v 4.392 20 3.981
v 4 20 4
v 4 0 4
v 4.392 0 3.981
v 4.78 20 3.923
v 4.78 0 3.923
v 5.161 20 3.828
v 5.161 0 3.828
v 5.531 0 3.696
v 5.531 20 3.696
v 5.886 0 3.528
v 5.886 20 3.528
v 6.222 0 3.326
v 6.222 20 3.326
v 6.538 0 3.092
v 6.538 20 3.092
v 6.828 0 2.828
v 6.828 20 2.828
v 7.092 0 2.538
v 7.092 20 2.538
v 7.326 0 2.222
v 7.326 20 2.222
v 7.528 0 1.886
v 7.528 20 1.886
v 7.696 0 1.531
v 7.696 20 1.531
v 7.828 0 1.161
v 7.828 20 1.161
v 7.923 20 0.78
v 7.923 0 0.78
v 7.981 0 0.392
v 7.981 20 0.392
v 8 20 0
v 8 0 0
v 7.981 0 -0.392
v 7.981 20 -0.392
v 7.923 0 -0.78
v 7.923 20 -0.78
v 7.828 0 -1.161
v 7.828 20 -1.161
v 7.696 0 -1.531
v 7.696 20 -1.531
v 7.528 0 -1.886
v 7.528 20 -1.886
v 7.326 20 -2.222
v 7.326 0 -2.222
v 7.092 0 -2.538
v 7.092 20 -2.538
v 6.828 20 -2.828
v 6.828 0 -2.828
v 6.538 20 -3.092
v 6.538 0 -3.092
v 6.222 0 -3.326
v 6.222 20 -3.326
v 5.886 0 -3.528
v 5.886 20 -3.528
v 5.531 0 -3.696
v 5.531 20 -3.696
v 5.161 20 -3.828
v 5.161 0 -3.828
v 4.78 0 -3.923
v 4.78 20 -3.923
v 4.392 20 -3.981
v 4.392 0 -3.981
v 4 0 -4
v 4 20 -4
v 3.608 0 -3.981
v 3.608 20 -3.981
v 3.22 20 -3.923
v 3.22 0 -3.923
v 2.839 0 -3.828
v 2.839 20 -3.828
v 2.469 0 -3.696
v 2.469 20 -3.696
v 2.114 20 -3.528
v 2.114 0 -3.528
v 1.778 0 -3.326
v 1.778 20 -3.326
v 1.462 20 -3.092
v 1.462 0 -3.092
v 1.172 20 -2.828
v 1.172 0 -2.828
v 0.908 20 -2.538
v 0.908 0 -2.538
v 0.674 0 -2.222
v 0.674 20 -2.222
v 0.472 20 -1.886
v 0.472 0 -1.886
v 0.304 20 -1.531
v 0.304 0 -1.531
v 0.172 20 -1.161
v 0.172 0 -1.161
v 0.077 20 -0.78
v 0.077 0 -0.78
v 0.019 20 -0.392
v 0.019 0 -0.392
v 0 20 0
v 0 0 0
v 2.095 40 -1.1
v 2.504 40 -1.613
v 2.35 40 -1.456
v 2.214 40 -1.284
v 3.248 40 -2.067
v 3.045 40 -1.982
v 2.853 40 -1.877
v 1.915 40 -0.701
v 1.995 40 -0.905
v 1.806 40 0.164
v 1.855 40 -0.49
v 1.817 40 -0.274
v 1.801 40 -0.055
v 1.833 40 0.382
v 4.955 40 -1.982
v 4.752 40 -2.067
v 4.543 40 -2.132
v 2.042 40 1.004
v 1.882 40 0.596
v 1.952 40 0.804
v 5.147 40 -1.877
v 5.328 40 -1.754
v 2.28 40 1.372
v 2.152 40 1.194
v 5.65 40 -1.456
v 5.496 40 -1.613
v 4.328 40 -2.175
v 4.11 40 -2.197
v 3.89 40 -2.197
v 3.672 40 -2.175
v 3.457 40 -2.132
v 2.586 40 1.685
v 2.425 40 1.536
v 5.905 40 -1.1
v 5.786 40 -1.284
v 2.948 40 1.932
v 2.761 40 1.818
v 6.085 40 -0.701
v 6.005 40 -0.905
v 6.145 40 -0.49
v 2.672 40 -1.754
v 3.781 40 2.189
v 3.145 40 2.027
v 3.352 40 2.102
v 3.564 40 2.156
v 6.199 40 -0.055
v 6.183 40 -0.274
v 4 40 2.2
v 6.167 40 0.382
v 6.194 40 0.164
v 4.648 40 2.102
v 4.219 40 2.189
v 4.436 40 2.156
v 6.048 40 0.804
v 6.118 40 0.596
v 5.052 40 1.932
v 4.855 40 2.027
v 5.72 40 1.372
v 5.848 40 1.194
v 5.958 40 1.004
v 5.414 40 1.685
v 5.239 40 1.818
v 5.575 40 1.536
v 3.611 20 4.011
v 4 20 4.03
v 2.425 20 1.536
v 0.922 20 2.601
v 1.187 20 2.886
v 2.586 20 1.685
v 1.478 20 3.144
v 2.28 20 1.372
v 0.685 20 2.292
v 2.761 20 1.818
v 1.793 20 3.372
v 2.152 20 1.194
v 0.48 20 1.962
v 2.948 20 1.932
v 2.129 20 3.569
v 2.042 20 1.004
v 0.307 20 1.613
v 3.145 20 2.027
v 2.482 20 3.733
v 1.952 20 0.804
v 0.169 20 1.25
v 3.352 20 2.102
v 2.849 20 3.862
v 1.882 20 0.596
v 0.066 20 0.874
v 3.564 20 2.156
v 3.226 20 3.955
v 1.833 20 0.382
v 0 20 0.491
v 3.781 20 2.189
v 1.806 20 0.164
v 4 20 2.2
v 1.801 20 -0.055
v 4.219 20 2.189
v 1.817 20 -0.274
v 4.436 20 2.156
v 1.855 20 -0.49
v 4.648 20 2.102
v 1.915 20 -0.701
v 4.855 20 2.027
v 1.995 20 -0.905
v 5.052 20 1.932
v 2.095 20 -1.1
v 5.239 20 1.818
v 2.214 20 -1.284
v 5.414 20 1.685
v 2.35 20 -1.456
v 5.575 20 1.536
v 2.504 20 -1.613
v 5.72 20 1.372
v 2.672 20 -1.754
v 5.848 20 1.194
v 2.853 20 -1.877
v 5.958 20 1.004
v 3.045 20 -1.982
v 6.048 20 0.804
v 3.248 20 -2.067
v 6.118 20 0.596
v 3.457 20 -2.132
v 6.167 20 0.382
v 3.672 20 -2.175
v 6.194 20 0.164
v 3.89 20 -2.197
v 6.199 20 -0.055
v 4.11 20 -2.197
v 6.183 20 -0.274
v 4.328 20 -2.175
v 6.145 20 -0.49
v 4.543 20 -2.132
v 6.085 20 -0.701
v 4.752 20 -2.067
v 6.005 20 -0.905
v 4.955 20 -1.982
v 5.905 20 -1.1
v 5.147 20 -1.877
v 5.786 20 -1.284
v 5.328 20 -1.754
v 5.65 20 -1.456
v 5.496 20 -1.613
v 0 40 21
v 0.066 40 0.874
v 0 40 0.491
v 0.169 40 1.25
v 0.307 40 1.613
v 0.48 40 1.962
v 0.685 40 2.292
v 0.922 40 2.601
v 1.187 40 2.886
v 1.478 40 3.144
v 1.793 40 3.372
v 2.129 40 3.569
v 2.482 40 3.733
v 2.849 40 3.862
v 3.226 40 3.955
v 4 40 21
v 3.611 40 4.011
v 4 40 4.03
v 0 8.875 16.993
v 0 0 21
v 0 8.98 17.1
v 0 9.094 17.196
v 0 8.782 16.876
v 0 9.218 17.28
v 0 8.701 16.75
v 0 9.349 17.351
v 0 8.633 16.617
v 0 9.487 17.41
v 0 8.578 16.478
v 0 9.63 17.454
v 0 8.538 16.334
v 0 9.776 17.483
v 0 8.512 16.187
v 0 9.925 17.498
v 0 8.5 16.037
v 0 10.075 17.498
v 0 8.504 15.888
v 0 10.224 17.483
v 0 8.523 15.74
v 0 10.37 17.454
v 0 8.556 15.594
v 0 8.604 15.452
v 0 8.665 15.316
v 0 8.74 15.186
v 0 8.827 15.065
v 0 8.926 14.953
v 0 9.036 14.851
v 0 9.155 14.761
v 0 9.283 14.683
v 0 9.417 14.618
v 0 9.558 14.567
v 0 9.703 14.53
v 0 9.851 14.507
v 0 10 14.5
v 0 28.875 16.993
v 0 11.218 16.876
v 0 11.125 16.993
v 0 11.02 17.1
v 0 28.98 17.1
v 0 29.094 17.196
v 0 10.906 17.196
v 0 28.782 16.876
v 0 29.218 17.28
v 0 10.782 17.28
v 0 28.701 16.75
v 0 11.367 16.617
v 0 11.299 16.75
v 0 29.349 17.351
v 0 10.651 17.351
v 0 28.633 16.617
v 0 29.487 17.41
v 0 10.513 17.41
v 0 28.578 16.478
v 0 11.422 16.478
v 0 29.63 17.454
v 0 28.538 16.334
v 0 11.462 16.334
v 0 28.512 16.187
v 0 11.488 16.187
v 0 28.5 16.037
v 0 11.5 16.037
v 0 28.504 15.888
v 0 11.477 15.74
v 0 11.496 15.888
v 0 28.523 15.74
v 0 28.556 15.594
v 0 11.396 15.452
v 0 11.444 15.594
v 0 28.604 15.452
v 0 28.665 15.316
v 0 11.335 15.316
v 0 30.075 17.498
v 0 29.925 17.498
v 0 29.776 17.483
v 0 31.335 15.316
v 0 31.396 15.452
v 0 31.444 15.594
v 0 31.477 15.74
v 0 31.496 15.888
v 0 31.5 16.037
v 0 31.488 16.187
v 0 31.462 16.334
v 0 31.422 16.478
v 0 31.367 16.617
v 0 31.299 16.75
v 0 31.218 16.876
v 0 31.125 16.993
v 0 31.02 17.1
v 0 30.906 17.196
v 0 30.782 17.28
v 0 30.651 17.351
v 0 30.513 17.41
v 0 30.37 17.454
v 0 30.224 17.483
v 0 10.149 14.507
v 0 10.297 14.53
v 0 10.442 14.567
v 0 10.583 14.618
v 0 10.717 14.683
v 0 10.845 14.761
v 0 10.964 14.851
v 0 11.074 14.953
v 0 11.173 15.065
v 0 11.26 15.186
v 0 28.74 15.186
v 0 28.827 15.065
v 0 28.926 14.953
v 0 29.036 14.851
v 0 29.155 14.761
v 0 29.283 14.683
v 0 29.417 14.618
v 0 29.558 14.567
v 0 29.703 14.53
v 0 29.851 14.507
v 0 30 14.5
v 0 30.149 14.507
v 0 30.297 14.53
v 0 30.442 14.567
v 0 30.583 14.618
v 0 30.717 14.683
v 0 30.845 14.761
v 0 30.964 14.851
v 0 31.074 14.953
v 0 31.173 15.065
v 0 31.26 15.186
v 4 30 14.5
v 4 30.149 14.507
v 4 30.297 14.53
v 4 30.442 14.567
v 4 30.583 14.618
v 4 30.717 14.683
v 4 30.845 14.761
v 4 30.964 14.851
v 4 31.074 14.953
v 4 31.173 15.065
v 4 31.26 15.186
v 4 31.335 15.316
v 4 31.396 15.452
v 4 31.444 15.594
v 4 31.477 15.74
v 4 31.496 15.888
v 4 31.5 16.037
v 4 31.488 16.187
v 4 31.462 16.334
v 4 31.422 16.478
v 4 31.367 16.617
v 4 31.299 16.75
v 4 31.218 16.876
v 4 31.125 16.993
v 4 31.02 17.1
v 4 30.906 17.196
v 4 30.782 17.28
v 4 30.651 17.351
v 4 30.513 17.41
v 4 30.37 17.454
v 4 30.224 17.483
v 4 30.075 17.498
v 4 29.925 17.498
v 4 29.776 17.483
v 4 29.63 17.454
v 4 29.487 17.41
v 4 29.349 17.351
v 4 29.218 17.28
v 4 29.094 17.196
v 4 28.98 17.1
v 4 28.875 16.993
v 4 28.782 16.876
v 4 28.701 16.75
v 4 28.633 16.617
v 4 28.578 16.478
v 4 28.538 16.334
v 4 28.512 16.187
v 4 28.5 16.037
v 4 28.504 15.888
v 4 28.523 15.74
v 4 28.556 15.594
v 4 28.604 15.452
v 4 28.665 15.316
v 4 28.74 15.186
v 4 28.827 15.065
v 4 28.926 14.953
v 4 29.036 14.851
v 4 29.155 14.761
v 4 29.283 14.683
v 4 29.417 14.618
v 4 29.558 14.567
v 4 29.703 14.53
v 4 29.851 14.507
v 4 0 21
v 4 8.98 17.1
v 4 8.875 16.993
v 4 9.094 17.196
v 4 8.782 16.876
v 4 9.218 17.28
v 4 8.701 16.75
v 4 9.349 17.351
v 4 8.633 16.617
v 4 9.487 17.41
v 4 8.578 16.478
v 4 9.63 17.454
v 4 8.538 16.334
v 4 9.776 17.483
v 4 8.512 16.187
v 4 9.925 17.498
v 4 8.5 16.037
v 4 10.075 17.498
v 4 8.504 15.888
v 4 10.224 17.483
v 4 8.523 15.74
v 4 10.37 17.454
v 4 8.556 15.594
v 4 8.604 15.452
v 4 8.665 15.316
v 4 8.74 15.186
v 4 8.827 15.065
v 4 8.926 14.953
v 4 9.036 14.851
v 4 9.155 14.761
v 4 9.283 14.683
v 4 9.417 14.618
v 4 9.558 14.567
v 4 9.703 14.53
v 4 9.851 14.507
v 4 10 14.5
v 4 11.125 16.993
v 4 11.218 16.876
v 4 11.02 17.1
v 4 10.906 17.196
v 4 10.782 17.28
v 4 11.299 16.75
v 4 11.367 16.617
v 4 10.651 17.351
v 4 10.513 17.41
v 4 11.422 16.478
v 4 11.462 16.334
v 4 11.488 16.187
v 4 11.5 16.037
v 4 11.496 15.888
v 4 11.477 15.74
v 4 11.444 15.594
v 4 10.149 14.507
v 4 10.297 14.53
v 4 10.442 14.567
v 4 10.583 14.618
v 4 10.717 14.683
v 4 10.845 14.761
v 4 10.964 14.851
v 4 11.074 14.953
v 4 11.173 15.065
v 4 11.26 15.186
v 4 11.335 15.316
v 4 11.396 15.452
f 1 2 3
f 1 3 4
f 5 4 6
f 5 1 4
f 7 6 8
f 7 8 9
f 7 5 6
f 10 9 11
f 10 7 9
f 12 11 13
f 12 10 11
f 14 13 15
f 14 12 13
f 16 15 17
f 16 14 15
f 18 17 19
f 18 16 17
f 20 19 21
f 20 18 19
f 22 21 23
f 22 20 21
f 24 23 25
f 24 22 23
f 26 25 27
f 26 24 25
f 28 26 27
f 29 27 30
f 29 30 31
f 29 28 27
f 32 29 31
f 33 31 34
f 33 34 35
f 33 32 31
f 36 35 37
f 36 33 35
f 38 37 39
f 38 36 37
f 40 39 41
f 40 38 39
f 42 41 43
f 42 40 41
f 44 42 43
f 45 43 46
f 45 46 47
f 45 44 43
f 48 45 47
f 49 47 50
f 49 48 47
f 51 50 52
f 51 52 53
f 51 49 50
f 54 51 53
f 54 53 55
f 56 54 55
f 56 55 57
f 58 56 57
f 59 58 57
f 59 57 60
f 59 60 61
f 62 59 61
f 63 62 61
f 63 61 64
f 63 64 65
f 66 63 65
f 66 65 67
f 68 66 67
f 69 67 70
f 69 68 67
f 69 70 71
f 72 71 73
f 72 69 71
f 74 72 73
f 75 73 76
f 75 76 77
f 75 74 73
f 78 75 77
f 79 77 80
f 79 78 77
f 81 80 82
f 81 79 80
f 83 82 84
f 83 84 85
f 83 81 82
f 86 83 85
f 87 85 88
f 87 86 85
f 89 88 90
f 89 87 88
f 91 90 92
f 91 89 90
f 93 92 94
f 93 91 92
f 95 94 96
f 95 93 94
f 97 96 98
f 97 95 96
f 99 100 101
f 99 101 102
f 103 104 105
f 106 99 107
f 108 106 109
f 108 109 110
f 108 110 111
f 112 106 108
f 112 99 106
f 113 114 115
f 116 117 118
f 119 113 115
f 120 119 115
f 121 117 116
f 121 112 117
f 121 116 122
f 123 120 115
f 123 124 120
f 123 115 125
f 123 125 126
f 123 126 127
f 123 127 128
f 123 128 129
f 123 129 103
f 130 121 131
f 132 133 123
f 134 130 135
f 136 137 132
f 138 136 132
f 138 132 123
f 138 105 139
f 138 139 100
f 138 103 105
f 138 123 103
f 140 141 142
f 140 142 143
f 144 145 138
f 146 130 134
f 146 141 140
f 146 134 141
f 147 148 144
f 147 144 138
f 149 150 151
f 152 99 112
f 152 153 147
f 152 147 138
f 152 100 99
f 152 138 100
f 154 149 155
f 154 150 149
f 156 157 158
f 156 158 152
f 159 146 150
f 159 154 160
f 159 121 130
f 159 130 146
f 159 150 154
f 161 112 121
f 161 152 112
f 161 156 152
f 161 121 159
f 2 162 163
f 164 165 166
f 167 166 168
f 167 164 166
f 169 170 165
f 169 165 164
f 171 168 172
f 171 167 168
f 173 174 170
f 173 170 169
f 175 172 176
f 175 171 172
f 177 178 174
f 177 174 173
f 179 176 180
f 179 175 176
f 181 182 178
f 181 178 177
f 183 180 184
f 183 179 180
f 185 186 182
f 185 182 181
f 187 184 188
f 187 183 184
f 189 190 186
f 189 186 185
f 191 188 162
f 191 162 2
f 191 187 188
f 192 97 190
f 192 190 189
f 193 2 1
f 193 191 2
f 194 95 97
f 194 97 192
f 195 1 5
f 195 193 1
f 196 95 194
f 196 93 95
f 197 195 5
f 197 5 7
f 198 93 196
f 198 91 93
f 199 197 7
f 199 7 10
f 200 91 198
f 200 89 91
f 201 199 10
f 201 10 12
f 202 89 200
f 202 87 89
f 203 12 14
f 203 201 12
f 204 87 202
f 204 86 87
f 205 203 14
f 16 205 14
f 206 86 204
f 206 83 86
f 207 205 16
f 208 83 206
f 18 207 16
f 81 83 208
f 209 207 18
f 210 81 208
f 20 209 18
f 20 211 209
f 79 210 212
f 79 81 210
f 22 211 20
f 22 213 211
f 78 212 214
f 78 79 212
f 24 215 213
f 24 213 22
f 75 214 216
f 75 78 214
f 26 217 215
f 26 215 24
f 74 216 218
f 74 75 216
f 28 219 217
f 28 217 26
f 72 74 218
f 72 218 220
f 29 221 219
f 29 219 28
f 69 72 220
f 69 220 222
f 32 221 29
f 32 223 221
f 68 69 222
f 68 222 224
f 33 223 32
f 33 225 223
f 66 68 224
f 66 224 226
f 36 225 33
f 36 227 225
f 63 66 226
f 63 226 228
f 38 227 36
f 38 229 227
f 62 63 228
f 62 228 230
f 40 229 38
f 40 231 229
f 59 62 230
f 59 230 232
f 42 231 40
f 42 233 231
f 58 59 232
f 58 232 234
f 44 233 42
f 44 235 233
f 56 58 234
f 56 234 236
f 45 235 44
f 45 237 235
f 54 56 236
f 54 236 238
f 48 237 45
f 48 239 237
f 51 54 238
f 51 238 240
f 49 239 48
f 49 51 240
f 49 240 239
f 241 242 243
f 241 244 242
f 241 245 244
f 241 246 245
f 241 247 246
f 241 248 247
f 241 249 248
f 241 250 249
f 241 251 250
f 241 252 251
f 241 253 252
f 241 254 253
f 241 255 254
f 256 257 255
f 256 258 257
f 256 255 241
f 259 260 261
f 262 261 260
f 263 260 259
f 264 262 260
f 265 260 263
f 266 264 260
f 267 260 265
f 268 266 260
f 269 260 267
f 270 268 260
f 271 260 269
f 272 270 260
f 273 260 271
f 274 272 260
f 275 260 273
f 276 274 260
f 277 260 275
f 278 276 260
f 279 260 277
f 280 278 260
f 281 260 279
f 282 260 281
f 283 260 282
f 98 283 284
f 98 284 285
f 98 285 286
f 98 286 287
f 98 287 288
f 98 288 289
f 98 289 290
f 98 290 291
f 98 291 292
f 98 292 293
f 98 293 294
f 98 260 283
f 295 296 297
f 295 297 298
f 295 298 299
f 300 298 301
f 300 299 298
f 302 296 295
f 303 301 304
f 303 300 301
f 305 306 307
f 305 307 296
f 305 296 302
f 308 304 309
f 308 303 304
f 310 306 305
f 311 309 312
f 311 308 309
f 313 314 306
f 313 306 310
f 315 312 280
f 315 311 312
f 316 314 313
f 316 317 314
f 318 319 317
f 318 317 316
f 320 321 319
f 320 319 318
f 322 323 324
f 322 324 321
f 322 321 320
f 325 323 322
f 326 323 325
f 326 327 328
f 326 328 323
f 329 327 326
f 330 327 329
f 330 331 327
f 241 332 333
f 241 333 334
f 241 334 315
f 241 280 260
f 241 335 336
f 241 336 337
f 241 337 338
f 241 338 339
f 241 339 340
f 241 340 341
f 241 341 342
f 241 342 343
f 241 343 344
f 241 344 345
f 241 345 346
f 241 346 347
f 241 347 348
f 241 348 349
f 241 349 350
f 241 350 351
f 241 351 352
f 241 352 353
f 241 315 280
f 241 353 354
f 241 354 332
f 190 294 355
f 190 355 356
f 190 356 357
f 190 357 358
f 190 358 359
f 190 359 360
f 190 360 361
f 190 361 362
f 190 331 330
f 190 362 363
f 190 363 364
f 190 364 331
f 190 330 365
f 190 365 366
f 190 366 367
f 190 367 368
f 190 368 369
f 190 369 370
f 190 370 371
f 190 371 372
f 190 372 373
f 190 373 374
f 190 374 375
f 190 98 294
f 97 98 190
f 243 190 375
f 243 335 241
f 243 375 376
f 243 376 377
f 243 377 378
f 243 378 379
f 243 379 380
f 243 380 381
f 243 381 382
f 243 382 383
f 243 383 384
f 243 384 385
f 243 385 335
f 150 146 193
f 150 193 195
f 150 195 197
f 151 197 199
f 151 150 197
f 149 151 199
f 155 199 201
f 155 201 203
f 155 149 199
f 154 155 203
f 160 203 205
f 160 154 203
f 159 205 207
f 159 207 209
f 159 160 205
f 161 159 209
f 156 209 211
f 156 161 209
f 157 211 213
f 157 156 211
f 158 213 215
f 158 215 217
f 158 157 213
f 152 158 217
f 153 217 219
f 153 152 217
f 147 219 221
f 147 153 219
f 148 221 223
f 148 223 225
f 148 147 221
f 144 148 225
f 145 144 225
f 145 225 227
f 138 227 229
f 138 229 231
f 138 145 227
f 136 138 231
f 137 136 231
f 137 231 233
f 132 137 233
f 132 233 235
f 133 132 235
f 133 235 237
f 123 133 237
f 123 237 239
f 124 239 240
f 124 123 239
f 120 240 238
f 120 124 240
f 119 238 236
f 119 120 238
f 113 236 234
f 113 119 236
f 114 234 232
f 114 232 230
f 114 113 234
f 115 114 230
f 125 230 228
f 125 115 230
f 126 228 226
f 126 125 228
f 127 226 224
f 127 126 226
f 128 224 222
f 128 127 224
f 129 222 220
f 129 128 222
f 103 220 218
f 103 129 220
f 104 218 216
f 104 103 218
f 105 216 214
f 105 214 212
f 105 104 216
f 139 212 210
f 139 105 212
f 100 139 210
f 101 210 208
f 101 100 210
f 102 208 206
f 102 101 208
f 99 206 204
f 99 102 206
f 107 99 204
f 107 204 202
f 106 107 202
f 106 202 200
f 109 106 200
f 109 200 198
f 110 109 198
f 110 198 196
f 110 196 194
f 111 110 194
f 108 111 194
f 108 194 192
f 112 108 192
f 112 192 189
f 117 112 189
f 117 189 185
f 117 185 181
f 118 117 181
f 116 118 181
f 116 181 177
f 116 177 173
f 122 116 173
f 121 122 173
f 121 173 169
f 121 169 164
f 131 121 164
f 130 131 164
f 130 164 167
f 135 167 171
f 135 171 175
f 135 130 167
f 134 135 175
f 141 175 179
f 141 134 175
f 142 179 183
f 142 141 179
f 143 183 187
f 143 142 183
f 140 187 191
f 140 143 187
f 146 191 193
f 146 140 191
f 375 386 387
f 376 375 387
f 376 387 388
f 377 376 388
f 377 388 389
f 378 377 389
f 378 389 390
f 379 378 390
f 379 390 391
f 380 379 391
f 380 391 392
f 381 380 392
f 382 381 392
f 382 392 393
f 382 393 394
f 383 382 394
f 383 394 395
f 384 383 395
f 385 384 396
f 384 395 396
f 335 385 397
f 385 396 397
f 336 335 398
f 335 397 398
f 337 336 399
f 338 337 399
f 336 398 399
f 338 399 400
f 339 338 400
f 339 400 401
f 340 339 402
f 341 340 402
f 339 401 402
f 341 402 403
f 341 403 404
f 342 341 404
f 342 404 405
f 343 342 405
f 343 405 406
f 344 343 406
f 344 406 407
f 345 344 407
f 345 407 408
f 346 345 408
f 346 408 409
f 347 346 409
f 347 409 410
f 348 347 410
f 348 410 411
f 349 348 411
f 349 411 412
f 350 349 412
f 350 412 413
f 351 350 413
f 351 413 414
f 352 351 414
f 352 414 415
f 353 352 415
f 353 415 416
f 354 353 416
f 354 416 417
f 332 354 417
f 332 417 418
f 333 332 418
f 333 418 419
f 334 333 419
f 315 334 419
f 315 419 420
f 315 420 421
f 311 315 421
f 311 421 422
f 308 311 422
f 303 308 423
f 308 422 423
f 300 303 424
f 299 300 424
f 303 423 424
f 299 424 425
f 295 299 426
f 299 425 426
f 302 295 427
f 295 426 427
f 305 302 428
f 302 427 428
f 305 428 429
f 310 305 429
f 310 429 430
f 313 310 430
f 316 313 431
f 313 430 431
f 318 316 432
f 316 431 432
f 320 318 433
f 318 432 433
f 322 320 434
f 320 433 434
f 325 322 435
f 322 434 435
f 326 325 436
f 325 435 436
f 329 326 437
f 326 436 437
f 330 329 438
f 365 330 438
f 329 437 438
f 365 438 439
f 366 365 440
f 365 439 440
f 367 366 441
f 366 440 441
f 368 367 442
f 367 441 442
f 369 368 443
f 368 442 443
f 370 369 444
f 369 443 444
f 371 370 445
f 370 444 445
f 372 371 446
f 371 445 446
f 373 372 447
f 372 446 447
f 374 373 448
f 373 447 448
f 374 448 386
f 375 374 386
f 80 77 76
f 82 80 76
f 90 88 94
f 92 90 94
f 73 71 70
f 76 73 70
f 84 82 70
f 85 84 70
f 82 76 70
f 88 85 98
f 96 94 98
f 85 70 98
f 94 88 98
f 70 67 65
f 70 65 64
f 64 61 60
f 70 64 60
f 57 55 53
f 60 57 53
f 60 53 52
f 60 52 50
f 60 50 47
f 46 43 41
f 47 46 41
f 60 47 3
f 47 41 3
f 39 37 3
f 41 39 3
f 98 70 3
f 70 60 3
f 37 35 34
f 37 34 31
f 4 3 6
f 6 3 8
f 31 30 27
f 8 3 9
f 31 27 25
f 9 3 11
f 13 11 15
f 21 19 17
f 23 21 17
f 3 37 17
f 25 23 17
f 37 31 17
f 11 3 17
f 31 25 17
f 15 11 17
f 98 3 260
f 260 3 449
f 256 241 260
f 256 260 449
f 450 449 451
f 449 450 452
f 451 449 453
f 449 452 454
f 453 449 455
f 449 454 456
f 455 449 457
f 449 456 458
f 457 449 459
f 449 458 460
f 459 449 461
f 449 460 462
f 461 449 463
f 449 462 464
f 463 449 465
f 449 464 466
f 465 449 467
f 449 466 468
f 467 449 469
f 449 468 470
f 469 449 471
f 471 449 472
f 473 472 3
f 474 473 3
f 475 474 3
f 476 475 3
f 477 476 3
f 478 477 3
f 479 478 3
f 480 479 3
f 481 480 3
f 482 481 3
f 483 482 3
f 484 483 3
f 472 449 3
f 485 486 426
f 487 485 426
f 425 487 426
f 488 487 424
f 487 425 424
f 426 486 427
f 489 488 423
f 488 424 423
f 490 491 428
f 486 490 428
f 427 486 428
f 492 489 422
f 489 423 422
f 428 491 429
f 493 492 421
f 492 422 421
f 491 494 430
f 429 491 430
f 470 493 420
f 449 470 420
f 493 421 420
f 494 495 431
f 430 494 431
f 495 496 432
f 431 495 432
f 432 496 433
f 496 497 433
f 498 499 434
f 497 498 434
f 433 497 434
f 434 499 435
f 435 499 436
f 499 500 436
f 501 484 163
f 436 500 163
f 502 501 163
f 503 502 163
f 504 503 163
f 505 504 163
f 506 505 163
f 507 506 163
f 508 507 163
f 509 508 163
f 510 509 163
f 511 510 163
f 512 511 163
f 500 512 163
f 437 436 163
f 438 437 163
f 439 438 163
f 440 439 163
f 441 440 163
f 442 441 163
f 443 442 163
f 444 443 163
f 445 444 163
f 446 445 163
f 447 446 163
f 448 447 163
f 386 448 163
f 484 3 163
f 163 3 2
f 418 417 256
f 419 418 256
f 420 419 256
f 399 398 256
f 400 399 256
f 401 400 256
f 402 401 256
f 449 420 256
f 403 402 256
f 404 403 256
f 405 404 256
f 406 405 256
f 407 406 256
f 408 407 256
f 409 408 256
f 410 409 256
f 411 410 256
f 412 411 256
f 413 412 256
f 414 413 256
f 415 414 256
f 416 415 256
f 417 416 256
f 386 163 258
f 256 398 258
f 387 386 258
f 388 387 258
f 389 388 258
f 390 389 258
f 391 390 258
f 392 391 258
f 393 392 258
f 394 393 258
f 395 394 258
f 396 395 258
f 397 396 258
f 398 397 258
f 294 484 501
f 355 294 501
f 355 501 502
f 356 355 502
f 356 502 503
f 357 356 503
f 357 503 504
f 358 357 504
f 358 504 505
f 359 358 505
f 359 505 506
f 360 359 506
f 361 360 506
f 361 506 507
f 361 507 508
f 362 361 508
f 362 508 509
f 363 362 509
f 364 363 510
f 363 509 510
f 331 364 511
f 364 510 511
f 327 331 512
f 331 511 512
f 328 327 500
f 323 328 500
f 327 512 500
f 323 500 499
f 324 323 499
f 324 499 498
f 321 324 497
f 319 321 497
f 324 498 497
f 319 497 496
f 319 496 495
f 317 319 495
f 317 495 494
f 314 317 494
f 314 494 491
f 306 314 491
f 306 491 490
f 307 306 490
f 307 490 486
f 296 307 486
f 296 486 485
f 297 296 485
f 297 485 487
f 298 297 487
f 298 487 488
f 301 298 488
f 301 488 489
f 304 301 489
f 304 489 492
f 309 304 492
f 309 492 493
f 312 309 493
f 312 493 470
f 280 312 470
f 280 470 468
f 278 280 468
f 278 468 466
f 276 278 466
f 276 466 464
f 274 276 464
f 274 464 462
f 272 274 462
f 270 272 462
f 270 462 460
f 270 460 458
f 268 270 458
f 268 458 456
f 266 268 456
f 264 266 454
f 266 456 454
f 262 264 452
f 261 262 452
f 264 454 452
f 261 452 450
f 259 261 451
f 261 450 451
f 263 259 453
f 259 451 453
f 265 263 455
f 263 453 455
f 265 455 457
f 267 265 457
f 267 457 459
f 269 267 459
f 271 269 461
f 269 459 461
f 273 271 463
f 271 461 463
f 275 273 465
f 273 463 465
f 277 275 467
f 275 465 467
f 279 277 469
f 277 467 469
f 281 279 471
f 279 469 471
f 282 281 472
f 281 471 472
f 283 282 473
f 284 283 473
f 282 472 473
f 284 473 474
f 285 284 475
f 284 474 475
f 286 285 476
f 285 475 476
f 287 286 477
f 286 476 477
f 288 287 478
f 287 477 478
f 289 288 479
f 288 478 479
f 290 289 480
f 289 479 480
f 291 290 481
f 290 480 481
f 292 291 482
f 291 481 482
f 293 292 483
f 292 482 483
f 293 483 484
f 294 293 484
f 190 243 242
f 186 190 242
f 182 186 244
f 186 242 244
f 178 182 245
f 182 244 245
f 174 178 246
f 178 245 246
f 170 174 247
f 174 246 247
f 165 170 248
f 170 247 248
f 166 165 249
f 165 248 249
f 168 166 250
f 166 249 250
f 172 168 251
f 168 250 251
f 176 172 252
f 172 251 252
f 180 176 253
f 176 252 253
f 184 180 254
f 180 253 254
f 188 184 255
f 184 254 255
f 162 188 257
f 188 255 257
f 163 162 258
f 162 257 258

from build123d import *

# Parameters (mm, degrees)
SKETCH1_W           = 4
SKETCH1_H           = 40
EXTRUDE_THIN2_DEPTH = 21
SKETCH4_R           = 4
SKETCH15_R          = 4.03
SKETCH15_R_2        = 2.2
CUT_EXTRUDE14_DEPTH = 20
SKETCH13_R          = 1.5
CUT_EXTRUDE10_DEPTH = 46.354161882


with BuildPart() as part:
    # Sketch1 → Extrude-Thin2 (new body)
    with BuildSketch(Plane.XY):
        with Locations((2, 20)):
            Rectangle(SKETCH1_W, SKETCH1_H)
    extrude(amount=EXTRUDE_THIN2_DEPTH)

    # Sweep3: sweep along a curve in space
    with BuildLine() as sweep3_path:
        Line((4, 0, 0), (4, 40, 0))
    # Sketch4 → Sweep3 (sweep)
    with BuildSketch(Plane(origin=(0, 40, 0), x_dir=(1, 0, 0), z_dir=(0, 1, 0))):
        with Locations((4, 0)):
            Circle(SKETCH4_R)
    sweep(path=sweep3_path.line)

    # Sketch15 → Cut-Extrude14 (cut)
    with BuildSketch(Plane(origin=(0, 40, 0), x_dir=(1, 0, 0), z_dir=(0, 1, 0))):
        with Locations((4, 0)):
            Circle(SKETCH15_R)
        with Locations(Location((4, 0, 0), (0, 0, 270))):
            Circle(SKETCH15_R_2, mode=Mode.SUBTRACT)
    extrude(amount=-CUT_EXTRUDE14_DEPTH, mode=Mode.SUBTRACT)

    # Sketch13 → Cut-Extrude10 (cut, through all)
    with BuildSketch(Plane(origin=(4, 0, 0), x_dir=(0, 0, -1), z_dir=(1, 0, 0))):
        with Locations((-16, 30)):
            Circle(SKETCH13_R)
        with Locations((-16, 10)):
            Circle(SKETCH13_R)
    extrude(amount=-CUT_EXTRUDE10_DEPTH, mode=Mode.SUBTRACT)


solid = part.part
